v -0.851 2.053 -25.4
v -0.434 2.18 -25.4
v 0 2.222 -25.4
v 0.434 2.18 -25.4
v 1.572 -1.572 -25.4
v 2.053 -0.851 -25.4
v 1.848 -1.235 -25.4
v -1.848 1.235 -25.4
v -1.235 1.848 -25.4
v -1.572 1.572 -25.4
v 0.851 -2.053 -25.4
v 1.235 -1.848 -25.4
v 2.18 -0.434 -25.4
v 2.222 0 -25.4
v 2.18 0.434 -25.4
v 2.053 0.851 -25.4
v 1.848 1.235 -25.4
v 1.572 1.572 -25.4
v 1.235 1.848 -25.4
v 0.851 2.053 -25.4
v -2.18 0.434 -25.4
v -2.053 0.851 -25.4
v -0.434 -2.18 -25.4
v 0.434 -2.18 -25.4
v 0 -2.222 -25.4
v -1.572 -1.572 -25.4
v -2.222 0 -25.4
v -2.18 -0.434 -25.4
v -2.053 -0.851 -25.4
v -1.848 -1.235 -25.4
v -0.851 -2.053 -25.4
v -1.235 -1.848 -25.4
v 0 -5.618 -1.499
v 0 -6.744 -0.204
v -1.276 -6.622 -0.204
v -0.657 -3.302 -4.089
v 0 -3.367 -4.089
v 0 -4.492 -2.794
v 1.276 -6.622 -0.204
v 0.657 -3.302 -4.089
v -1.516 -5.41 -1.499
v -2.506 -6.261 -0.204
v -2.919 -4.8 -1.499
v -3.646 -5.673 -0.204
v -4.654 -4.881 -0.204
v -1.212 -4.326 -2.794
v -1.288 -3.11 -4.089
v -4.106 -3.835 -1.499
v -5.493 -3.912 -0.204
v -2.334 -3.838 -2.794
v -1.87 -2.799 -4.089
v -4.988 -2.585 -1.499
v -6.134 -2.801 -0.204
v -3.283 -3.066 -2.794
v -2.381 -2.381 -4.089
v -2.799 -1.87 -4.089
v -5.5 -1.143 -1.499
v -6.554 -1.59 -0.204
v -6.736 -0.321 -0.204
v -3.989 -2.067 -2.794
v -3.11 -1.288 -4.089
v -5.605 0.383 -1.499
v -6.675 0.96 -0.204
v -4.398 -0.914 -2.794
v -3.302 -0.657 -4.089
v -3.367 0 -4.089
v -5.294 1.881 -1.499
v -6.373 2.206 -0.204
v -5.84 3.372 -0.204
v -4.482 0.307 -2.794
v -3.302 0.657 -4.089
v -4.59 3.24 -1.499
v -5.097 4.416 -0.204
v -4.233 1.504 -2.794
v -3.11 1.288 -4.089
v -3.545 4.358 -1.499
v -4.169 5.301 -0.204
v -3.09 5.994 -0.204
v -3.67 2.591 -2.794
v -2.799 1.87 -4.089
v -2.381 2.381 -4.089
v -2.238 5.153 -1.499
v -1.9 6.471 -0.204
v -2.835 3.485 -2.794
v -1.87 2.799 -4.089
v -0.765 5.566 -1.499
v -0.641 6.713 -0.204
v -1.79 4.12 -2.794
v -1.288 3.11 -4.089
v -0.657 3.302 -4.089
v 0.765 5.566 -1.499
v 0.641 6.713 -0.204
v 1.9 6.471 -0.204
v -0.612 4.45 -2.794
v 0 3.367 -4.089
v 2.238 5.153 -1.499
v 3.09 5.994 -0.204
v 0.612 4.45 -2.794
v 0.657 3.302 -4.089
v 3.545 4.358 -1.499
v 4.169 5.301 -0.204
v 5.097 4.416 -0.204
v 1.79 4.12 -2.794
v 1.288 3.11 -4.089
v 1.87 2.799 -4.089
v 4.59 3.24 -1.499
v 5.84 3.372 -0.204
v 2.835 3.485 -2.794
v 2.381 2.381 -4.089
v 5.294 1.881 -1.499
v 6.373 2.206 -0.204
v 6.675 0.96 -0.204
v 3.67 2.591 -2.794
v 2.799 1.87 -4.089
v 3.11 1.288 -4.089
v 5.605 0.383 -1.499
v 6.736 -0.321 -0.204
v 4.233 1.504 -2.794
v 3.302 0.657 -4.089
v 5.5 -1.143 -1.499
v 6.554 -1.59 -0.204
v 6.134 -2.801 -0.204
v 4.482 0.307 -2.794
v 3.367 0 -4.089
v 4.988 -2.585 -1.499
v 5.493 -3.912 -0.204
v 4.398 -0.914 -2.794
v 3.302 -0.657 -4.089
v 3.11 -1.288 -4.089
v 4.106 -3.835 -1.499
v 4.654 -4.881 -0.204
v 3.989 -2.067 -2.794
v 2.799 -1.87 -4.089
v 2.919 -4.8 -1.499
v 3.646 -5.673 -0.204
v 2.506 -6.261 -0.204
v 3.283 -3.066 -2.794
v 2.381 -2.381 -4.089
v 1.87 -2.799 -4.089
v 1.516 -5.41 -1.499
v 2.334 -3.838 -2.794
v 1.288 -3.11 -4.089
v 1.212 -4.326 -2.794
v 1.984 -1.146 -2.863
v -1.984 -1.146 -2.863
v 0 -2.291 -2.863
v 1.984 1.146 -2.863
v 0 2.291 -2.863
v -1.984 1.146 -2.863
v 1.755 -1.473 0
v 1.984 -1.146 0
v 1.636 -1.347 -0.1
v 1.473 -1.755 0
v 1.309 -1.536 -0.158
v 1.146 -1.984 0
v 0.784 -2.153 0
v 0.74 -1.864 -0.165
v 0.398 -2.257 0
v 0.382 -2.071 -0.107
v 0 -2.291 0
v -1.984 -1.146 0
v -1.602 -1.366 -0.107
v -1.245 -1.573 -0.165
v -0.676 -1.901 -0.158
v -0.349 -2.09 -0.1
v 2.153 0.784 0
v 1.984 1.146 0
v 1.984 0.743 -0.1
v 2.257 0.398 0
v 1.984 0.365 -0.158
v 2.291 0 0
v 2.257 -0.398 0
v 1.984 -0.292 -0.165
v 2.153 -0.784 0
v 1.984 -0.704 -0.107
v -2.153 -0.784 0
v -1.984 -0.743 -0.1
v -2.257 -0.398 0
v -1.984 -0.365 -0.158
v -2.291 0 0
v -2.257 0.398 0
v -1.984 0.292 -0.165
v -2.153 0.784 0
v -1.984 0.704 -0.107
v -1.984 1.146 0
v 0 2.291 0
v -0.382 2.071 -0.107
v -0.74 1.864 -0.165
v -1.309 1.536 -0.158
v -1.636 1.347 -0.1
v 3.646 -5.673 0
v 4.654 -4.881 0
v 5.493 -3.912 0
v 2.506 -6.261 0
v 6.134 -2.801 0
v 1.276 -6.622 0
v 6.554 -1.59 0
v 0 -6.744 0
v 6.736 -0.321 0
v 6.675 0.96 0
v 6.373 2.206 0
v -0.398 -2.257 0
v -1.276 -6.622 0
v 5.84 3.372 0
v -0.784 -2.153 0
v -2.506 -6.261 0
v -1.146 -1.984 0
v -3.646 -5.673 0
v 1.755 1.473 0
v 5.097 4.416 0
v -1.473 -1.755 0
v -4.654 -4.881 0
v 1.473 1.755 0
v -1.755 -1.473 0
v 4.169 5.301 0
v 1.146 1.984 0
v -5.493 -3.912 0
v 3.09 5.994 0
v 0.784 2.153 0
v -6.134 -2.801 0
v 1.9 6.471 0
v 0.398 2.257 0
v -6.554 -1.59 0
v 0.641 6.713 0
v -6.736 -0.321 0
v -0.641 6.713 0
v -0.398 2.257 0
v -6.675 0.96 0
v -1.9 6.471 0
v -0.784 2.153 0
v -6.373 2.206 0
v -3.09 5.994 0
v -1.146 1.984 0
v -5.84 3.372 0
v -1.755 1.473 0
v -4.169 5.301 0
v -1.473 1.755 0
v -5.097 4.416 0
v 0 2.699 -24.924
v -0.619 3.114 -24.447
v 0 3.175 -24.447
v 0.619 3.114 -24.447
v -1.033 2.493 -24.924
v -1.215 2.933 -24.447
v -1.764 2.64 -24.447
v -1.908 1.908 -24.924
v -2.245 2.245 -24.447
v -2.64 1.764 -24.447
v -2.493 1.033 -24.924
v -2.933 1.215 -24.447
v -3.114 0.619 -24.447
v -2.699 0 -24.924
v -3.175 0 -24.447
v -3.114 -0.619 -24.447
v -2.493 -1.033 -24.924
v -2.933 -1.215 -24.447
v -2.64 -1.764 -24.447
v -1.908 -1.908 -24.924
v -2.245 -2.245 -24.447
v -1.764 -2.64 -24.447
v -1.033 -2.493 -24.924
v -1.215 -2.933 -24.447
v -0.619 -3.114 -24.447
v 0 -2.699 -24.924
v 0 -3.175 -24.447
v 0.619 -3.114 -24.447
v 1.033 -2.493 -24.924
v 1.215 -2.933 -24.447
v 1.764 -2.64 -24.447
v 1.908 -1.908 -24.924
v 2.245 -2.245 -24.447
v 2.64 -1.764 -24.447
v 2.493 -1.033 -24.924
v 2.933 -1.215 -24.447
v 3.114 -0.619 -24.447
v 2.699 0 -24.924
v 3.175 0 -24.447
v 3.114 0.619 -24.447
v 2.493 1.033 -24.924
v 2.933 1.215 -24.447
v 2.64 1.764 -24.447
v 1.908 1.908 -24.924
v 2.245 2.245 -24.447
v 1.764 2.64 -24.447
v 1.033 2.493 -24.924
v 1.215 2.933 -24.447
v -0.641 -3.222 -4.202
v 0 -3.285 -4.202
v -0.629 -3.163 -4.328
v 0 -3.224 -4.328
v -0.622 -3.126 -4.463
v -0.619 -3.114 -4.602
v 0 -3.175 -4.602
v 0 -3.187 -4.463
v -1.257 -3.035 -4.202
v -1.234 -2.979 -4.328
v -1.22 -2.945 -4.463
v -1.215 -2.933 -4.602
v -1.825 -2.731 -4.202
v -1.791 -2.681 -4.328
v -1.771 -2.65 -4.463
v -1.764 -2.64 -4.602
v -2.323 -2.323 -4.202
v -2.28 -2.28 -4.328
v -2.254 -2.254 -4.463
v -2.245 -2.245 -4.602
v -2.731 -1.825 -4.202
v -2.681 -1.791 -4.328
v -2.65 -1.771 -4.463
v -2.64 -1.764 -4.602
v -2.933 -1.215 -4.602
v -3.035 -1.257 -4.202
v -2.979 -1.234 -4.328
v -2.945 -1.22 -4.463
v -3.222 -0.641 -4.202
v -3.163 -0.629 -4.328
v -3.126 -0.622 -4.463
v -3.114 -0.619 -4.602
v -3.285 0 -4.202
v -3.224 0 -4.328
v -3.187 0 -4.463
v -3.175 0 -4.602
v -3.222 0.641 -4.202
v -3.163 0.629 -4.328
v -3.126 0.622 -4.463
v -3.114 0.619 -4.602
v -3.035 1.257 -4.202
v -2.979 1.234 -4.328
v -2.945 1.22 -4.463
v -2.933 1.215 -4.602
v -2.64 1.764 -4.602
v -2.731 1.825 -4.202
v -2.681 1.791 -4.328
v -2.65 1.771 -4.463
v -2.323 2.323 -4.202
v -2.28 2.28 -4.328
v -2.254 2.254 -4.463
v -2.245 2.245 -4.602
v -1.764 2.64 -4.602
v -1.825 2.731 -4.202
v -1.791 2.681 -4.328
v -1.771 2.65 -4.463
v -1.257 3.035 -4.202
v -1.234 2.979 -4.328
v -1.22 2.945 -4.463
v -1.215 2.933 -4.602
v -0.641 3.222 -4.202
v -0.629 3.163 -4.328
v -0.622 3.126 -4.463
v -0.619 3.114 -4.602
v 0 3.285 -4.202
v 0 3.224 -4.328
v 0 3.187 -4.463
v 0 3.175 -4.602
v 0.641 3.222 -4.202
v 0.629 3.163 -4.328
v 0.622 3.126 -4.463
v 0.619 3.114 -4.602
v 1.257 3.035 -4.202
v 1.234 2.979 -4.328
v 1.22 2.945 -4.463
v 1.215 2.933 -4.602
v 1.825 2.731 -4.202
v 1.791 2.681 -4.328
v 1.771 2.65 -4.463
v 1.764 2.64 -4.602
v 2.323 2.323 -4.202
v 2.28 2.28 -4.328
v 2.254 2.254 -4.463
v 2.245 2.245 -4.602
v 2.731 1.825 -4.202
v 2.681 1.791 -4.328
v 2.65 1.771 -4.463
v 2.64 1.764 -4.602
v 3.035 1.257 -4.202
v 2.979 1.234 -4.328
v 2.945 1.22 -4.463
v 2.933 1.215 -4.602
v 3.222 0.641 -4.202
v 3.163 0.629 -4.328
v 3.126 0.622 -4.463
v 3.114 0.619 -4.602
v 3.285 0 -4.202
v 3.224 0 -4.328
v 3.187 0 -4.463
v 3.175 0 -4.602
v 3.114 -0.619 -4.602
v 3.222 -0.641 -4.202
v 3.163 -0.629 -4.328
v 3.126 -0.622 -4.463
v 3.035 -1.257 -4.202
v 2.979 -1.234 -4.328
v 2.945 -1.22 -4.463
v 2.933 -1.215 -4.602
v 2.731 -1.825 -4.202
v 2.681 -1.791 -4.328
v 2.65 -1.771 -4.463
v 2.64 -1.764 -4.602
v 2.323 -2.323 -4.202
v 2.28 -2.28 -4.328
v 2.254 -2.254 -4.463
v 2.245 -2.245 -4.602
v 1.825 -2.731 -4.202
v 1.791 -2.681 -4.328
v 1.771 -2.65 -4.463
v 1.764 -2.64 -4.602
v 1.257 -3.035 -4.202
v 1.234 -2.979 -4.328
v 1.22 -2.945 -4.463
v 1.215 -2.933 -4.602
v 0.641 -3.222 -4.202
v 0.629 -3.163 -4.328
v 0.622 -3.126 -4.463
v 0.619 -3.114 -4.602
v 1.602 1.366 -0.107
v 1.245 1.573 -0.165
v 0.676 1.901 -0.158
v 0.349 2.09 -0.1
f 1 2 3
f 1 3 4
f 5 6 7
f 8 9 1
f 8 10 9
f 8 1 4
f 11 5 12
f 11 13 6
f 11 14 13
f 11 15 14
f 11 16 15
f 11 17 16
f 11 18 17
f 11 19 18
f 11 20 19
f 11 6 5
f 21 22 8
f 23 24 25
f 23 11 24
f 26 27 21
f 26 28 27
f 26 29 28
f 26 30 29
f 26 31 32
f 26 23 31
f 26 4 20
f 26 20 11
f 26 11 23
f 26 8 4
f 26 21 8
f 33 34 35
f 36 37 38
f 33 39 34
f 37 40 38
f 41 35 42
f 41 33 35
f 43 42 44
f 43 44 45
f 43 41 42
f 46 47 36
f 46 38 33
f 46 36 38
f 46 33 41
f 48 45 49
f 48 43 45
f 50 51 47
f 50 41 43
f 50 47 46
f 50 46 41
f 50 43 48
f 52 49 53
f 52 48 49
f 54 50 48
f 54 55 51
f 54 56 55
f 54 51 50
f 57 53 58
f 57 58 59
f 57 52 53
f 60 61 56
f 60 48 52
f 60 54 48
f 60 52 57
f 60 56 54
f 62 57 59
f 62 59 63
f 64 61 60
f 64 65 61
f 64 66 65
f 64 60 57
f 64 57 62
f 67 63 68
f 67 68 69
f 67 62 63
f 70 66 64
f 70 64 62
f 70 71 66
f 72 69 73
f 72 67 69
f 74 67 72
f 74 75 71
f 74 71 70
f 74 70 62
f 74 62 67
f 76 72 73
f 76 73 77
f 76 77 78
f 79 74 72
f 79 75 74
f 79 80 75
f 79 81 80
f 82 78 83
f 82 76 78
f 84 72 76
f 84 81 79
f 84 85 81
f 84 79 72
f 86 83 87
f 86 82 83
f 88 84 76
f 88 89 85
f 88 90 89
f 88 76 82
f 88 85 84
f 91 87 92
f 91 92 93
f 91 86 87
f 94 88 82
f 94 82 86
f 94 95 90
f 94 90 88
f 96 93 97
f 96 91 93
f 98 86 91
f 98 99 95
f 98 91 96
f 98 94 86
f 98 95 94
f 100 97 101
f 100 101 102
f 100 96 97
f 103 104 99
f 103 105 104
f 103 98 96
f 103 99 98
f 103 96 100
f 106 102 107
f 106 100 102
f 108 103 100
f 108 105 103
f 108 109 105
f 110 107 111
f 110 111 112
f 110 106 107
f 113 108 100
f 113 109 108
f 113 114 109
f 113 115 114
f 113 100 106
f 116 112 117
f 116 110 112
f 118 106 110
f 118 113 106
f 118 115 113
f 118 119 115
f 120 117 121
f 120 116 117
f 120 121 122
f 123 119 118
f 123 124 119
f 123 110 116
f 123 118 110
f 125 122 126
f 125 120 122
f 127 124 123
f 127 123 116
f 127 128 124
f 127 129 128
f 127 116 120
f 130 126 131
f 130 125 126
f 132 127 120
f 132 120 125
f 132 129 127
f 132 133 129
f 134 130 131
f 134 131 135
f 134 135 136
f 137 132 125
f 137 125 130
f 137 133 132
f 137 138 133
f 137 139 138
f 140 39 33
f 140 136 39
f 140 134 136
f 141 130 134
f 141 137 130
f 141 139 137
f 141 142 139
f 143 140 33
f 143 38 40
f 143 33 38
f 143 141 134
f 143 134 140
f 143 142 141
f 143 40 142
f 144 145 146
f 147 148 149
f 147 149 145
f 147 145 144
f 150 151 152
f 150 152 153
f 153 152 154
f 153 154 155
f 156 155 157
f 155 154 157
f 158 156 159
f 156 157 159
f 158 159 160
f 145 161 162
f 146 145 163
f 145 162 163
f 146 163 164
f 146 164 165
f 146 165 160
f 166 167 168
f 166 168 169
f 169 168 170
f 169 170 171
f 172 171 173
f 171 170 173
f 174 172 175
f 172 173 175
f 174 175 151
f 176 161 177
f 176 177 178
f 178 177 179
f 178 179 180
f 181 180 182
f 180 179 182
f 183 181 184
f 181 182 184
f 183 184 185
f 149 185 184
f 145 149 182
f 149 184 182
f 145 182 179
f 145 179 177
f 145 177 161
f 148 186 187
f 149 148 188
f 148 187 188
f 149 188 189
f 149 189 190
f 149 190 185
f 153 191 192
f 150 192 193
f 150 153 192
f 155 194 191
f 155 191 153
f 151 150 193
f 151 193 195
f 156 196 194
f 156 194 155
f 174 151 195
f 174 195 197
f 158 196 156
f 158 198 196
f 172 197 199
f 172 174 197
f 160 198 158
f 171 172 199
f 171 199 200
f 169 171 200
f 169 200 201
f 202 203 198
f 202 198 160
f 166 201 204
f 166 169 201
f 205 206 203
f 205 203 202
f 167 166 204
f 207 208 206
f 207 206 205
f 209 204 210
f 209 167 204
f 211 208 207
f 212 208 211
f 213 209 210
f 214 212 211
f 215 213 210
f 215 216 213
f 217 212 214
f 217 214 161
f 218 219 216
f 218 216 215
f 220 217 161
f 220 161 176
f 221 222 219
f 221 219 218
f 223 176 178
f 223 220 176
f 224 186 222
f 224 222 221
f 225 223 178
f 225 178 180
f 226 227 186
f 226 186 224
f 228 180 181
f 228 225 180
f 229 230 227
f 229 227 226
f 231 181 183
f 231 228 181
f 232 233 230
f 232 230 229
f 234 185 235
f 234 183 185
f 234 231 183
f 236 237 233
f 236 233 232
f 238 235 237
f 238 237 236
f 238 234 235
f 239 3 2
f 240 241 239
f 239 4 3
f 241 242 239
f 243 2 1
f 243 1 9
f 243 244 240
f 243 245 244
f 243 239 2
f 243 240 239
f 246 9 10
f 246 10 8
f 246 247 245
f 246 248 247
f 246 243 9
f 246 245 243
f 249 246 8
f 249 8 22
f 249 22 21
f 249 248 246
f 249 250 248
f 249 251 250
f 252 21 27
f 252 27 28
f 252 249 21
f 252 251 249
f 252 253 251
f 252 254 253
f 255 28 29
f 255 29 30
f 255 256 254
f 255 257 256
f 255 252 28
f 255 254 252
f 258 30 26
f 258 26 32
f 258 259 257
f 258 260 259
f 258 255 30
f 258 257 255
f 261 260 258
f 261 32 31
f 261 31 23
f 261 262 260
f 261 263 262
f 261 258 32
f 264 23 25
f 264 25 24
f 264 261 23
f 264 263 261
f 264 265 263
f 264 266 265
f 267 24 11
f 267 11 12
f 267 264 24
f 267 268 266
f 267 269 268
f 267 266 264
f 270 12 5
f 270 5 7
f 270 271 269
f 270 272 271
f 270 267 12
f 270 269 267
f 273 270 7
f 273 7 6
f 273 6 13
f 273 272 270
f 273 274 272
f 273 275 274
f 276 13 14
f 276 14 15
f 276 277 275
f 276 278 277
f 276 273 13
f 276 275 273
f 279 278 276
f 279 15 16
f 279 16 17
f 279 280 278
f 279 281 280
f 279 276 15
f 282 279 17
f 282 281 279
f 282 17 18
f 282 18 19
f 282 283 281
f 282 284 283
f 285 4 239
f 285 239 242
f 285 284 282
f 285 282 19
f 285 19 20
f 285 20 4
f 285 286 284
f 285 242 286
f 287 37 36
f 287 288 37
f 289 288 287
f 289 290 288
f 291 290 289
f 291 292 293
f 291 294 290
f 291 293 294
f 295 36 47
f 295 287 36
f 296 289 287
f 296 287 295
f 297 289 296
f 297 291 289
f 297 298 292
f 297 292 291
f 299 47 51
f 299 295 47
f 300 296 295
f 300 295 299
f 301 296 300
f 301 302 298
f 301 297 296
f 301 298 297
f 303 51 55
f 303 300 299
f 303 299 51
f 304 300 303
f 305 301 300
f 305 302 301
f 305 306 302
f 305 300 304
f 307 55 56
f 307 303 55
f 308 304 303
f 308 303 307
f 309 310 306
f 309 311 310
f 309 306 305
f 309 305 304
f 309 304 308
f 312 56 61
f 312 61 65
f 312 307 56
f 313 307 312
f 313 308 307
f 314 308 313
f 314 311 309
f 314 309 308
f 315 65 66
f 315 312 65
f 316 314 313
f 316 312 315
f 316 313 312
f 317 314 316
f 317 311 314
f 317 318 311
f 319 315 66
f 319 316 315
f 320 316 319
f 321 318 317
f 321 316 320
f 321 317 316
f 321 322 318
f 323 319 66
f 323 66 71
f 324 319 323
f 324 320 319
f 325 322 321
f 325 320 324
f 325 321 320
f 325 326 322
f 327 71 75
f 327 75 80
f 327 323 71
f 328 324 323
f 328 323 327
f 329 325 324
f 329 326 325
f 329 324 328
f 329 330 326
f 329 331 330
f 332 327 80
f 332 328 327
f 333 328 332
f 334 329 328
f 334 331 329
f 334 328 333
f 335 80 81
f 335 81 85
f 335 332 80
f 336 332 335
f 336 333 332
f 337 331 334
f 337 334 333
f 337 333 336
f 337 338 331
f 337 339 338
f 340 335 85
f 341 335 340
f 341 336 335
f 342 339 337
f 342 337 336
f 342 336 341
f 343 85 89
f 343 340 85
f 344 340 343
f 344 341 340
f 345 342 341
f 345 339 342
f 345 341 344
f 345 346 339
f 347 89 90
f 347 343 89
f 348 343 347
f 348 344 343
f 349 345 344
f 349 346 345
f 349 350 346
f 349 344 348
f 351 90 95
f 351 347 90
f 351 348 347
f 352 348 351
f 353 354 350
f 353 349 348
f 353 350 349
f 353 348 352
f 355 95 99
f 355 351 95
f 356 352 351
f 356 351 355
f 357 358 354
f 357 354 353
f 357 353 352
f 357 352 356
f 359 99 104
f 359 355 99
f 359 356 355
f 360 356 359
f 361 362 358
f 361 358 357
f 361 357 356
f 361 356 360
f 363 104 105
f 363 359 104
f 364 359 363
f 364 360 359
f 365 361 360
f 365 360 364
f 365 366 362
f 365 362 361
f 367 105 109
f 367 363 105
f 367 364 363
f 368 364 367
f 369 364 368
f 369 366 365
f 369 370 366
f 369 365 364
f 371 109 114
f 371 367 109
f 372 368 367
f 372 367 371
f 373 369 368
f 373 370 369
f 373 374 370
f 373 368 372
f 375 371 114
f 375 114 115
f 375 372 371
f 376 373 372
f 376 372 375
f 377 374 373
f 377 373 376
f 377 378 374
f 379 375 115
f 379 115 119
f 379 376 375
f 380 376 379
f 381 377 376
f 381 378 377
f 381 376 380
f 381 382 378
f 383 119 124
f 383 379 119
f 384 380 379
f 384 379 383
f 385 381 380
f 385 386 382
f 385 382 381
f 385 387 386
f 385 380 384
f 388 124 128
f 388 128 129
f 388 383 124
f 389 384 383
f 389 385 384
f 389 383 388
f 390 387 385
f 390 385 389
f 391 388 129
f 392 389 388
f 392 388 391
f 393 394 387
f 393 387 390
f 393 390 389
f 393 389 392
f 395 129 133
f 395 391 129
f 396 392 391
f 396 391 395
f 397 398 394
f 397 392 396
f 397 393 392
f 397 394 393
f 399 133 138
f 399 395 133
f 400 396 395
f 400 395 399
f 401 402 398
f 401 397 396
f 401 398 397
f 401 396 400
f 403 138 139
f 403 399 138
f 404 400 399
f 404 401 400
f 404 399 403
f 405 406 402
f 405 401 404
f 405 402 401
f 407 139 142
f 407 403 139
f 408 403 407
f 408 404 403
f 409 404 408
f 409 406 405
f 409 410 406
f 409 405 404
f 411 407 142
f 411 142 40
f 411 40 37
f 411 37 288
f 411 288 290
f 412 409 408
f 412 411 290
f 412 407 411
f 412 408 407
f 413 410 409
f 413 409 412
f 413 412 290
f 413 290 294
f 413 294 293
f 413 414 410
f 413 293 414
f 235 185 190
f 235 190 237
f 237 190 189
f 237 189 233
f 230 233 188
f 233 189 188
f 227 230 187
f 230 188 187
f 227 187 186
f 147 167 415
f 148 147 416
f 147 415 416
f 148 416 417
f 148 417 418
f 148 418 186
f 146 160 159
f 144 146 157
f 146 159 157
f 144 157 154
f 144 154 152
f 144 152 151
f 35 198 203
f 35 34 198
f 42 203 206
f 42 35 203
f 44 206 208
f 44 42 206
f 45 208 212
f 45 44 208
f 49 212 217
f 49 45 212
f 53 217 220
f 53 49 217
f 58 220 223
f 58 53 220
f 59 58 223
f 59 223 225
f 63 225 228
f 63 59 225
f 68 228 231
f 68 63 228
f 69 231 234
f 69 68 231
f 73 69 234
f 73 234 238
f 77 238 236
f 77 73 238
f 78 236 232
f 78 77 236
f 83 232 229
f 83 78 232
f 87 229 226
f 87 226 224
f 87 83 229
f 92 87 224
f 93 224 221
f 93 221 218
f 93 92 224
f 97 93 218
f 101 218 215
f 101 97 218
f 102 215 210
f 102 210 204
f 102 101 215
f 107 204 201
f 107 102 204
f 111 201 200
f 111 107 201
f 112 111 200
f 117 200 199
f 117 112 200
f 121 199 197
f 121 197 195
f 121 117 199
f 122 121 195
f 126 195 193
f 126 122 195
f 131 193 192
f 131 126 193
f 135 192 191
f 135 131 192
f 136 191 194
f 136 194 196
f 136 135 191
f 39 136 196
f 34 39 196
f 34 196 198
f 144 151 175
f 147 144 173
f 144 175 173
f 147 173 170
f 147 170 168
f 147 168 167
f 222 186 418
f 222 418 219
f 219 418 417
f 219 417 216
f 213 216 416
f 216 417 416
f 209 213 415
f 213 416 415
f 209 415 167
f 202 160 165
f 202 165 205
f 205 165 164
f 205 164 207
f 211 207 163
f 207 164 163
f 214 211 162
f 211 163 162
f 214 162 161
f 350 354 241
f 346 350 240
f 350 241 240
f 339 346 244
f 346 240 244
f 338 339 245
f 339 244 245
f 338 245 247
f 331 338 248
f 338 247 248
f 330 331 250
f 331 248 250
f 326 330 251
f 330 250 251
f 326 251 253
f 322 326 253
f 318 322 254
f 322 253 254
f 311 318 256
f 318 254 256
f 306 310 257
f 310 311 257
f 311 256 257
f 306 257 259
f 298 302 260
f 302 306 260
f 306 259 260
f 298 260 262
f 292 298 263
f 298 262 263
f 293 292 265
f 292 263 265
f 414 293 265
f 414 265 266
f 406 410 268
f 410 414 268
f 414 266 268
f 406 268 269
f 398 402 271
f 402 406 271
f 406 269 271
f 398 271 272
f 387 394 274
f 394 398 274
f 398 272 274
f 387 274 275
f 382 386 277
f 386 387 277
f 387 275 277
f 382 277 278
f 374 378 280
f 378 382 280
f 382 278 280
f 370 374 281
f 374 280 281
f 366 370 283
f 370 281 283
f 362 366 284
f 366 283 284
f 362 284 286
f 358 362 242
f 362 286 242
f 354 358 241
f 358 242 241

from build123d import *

# Parameters (mm, degrees)
SKETCH1_W          = 25.4
SKETCH1_H          = 3.175
CHAMFER1_SIZE      = 0.9525
CUT_EXTRUDE2_DEPTH = 2.86258


with BuildPart() as part:
    # Sketch1 → Revolve1 (revolve)
    with BuildSketch(Plane(origin=(0, 0, 0), x_dir=(0, 0, -1), z_dir=(1, 0, 0))):
        with Locations((12.7, 1.5875)):
            Rectangle(SKETCH1_W, SKETCH1_H)
    revolve(axis=Axis((0, 0, -25.4), (0, 0, 1)))

    # Chamfer1
    chamfer1_edges = [part.edges().sort_by_distance(p)[0] for p in [
        (0, -3.175, -25.4),
    ]]
    chamfer(chamfer1_edges, length=CHAMFER1_SIZE)

    # Sketch7 → Revolve2 (revolve)
    with BuildSketch(Plane(origin=(0, 0, 0), x_dir=(0, 0, -1), z_dir=(1, 0, 0)), mode=Mode.PRIVATE) as revolve2_sk:
        with BuildLine():
            Line((0, 6.7437), (0.20447, 6.7437))
            Line((0.20447, 6.7437), (4.0894, 3.366581874))
            ThreePointArc((4.0894, 3.366581874), (4.328282675, 3.224461616), (4.601808997, 3.175))
            Line((4.601808997, 3.175), (4.601808997, 0))
            Line((4.601808997, 0), (0, 0))
            Line((0, 0), (0, 6.7437))
        make_face()
    revolve(revolve2_sk.sketch.rotate(Axis((0, 0, 0), (0, 0, -1)), 180), axis=Axis((0, 0, 0), (0, 0, -1)))

    # Boss-Extrude1 cone 1 section (through the dimple's axis) → Boss-Extrude1 (revolve)
    with BuildSketch(Plane(origin=(0, 0, -4.601808997), x_dir=(0, -1, 0), z_dir=(1, 0, 0))):
        Polygon((0, 0), (3.175, 0), (0, 3.06606186), align=None)
    revolve(axis=Axis((0, 0, -4.601808997), (0, 0, -1)))

    # Sketch5 → Cut-Extrude2 (cut)
    with BuildSketch(Plane.XY):
        Polygon((0, 2.291358881), (-1.984375, 1.14567944), (-1.984375, -1.14567944), (0, -2.291358881), (1.984375, -1.14567944), (1.984375, 1.14567944), align=None)
    extrude(amount=-CUT_EXTRUDE2_DEPTH, mode=Mode.SUBTRACT)

    # Cut-Extrude3 cone 1 section (through the dimple's axis) → Cut-Extrude3 (revolve, cut)
    with BuildSketch(Plane(origin=(0, 0, 0), x_dir=(0, -1, 0), z_dir=(1, 0, 0))):
        Polygon((0, 0), (2.291358881, 0), (0, 1.322916667), align=None)
    revolve(axis=Axis((0, 0, 0), (0, 0, -1)), mode=Mode.SUBTRACT)


solid = part.part
